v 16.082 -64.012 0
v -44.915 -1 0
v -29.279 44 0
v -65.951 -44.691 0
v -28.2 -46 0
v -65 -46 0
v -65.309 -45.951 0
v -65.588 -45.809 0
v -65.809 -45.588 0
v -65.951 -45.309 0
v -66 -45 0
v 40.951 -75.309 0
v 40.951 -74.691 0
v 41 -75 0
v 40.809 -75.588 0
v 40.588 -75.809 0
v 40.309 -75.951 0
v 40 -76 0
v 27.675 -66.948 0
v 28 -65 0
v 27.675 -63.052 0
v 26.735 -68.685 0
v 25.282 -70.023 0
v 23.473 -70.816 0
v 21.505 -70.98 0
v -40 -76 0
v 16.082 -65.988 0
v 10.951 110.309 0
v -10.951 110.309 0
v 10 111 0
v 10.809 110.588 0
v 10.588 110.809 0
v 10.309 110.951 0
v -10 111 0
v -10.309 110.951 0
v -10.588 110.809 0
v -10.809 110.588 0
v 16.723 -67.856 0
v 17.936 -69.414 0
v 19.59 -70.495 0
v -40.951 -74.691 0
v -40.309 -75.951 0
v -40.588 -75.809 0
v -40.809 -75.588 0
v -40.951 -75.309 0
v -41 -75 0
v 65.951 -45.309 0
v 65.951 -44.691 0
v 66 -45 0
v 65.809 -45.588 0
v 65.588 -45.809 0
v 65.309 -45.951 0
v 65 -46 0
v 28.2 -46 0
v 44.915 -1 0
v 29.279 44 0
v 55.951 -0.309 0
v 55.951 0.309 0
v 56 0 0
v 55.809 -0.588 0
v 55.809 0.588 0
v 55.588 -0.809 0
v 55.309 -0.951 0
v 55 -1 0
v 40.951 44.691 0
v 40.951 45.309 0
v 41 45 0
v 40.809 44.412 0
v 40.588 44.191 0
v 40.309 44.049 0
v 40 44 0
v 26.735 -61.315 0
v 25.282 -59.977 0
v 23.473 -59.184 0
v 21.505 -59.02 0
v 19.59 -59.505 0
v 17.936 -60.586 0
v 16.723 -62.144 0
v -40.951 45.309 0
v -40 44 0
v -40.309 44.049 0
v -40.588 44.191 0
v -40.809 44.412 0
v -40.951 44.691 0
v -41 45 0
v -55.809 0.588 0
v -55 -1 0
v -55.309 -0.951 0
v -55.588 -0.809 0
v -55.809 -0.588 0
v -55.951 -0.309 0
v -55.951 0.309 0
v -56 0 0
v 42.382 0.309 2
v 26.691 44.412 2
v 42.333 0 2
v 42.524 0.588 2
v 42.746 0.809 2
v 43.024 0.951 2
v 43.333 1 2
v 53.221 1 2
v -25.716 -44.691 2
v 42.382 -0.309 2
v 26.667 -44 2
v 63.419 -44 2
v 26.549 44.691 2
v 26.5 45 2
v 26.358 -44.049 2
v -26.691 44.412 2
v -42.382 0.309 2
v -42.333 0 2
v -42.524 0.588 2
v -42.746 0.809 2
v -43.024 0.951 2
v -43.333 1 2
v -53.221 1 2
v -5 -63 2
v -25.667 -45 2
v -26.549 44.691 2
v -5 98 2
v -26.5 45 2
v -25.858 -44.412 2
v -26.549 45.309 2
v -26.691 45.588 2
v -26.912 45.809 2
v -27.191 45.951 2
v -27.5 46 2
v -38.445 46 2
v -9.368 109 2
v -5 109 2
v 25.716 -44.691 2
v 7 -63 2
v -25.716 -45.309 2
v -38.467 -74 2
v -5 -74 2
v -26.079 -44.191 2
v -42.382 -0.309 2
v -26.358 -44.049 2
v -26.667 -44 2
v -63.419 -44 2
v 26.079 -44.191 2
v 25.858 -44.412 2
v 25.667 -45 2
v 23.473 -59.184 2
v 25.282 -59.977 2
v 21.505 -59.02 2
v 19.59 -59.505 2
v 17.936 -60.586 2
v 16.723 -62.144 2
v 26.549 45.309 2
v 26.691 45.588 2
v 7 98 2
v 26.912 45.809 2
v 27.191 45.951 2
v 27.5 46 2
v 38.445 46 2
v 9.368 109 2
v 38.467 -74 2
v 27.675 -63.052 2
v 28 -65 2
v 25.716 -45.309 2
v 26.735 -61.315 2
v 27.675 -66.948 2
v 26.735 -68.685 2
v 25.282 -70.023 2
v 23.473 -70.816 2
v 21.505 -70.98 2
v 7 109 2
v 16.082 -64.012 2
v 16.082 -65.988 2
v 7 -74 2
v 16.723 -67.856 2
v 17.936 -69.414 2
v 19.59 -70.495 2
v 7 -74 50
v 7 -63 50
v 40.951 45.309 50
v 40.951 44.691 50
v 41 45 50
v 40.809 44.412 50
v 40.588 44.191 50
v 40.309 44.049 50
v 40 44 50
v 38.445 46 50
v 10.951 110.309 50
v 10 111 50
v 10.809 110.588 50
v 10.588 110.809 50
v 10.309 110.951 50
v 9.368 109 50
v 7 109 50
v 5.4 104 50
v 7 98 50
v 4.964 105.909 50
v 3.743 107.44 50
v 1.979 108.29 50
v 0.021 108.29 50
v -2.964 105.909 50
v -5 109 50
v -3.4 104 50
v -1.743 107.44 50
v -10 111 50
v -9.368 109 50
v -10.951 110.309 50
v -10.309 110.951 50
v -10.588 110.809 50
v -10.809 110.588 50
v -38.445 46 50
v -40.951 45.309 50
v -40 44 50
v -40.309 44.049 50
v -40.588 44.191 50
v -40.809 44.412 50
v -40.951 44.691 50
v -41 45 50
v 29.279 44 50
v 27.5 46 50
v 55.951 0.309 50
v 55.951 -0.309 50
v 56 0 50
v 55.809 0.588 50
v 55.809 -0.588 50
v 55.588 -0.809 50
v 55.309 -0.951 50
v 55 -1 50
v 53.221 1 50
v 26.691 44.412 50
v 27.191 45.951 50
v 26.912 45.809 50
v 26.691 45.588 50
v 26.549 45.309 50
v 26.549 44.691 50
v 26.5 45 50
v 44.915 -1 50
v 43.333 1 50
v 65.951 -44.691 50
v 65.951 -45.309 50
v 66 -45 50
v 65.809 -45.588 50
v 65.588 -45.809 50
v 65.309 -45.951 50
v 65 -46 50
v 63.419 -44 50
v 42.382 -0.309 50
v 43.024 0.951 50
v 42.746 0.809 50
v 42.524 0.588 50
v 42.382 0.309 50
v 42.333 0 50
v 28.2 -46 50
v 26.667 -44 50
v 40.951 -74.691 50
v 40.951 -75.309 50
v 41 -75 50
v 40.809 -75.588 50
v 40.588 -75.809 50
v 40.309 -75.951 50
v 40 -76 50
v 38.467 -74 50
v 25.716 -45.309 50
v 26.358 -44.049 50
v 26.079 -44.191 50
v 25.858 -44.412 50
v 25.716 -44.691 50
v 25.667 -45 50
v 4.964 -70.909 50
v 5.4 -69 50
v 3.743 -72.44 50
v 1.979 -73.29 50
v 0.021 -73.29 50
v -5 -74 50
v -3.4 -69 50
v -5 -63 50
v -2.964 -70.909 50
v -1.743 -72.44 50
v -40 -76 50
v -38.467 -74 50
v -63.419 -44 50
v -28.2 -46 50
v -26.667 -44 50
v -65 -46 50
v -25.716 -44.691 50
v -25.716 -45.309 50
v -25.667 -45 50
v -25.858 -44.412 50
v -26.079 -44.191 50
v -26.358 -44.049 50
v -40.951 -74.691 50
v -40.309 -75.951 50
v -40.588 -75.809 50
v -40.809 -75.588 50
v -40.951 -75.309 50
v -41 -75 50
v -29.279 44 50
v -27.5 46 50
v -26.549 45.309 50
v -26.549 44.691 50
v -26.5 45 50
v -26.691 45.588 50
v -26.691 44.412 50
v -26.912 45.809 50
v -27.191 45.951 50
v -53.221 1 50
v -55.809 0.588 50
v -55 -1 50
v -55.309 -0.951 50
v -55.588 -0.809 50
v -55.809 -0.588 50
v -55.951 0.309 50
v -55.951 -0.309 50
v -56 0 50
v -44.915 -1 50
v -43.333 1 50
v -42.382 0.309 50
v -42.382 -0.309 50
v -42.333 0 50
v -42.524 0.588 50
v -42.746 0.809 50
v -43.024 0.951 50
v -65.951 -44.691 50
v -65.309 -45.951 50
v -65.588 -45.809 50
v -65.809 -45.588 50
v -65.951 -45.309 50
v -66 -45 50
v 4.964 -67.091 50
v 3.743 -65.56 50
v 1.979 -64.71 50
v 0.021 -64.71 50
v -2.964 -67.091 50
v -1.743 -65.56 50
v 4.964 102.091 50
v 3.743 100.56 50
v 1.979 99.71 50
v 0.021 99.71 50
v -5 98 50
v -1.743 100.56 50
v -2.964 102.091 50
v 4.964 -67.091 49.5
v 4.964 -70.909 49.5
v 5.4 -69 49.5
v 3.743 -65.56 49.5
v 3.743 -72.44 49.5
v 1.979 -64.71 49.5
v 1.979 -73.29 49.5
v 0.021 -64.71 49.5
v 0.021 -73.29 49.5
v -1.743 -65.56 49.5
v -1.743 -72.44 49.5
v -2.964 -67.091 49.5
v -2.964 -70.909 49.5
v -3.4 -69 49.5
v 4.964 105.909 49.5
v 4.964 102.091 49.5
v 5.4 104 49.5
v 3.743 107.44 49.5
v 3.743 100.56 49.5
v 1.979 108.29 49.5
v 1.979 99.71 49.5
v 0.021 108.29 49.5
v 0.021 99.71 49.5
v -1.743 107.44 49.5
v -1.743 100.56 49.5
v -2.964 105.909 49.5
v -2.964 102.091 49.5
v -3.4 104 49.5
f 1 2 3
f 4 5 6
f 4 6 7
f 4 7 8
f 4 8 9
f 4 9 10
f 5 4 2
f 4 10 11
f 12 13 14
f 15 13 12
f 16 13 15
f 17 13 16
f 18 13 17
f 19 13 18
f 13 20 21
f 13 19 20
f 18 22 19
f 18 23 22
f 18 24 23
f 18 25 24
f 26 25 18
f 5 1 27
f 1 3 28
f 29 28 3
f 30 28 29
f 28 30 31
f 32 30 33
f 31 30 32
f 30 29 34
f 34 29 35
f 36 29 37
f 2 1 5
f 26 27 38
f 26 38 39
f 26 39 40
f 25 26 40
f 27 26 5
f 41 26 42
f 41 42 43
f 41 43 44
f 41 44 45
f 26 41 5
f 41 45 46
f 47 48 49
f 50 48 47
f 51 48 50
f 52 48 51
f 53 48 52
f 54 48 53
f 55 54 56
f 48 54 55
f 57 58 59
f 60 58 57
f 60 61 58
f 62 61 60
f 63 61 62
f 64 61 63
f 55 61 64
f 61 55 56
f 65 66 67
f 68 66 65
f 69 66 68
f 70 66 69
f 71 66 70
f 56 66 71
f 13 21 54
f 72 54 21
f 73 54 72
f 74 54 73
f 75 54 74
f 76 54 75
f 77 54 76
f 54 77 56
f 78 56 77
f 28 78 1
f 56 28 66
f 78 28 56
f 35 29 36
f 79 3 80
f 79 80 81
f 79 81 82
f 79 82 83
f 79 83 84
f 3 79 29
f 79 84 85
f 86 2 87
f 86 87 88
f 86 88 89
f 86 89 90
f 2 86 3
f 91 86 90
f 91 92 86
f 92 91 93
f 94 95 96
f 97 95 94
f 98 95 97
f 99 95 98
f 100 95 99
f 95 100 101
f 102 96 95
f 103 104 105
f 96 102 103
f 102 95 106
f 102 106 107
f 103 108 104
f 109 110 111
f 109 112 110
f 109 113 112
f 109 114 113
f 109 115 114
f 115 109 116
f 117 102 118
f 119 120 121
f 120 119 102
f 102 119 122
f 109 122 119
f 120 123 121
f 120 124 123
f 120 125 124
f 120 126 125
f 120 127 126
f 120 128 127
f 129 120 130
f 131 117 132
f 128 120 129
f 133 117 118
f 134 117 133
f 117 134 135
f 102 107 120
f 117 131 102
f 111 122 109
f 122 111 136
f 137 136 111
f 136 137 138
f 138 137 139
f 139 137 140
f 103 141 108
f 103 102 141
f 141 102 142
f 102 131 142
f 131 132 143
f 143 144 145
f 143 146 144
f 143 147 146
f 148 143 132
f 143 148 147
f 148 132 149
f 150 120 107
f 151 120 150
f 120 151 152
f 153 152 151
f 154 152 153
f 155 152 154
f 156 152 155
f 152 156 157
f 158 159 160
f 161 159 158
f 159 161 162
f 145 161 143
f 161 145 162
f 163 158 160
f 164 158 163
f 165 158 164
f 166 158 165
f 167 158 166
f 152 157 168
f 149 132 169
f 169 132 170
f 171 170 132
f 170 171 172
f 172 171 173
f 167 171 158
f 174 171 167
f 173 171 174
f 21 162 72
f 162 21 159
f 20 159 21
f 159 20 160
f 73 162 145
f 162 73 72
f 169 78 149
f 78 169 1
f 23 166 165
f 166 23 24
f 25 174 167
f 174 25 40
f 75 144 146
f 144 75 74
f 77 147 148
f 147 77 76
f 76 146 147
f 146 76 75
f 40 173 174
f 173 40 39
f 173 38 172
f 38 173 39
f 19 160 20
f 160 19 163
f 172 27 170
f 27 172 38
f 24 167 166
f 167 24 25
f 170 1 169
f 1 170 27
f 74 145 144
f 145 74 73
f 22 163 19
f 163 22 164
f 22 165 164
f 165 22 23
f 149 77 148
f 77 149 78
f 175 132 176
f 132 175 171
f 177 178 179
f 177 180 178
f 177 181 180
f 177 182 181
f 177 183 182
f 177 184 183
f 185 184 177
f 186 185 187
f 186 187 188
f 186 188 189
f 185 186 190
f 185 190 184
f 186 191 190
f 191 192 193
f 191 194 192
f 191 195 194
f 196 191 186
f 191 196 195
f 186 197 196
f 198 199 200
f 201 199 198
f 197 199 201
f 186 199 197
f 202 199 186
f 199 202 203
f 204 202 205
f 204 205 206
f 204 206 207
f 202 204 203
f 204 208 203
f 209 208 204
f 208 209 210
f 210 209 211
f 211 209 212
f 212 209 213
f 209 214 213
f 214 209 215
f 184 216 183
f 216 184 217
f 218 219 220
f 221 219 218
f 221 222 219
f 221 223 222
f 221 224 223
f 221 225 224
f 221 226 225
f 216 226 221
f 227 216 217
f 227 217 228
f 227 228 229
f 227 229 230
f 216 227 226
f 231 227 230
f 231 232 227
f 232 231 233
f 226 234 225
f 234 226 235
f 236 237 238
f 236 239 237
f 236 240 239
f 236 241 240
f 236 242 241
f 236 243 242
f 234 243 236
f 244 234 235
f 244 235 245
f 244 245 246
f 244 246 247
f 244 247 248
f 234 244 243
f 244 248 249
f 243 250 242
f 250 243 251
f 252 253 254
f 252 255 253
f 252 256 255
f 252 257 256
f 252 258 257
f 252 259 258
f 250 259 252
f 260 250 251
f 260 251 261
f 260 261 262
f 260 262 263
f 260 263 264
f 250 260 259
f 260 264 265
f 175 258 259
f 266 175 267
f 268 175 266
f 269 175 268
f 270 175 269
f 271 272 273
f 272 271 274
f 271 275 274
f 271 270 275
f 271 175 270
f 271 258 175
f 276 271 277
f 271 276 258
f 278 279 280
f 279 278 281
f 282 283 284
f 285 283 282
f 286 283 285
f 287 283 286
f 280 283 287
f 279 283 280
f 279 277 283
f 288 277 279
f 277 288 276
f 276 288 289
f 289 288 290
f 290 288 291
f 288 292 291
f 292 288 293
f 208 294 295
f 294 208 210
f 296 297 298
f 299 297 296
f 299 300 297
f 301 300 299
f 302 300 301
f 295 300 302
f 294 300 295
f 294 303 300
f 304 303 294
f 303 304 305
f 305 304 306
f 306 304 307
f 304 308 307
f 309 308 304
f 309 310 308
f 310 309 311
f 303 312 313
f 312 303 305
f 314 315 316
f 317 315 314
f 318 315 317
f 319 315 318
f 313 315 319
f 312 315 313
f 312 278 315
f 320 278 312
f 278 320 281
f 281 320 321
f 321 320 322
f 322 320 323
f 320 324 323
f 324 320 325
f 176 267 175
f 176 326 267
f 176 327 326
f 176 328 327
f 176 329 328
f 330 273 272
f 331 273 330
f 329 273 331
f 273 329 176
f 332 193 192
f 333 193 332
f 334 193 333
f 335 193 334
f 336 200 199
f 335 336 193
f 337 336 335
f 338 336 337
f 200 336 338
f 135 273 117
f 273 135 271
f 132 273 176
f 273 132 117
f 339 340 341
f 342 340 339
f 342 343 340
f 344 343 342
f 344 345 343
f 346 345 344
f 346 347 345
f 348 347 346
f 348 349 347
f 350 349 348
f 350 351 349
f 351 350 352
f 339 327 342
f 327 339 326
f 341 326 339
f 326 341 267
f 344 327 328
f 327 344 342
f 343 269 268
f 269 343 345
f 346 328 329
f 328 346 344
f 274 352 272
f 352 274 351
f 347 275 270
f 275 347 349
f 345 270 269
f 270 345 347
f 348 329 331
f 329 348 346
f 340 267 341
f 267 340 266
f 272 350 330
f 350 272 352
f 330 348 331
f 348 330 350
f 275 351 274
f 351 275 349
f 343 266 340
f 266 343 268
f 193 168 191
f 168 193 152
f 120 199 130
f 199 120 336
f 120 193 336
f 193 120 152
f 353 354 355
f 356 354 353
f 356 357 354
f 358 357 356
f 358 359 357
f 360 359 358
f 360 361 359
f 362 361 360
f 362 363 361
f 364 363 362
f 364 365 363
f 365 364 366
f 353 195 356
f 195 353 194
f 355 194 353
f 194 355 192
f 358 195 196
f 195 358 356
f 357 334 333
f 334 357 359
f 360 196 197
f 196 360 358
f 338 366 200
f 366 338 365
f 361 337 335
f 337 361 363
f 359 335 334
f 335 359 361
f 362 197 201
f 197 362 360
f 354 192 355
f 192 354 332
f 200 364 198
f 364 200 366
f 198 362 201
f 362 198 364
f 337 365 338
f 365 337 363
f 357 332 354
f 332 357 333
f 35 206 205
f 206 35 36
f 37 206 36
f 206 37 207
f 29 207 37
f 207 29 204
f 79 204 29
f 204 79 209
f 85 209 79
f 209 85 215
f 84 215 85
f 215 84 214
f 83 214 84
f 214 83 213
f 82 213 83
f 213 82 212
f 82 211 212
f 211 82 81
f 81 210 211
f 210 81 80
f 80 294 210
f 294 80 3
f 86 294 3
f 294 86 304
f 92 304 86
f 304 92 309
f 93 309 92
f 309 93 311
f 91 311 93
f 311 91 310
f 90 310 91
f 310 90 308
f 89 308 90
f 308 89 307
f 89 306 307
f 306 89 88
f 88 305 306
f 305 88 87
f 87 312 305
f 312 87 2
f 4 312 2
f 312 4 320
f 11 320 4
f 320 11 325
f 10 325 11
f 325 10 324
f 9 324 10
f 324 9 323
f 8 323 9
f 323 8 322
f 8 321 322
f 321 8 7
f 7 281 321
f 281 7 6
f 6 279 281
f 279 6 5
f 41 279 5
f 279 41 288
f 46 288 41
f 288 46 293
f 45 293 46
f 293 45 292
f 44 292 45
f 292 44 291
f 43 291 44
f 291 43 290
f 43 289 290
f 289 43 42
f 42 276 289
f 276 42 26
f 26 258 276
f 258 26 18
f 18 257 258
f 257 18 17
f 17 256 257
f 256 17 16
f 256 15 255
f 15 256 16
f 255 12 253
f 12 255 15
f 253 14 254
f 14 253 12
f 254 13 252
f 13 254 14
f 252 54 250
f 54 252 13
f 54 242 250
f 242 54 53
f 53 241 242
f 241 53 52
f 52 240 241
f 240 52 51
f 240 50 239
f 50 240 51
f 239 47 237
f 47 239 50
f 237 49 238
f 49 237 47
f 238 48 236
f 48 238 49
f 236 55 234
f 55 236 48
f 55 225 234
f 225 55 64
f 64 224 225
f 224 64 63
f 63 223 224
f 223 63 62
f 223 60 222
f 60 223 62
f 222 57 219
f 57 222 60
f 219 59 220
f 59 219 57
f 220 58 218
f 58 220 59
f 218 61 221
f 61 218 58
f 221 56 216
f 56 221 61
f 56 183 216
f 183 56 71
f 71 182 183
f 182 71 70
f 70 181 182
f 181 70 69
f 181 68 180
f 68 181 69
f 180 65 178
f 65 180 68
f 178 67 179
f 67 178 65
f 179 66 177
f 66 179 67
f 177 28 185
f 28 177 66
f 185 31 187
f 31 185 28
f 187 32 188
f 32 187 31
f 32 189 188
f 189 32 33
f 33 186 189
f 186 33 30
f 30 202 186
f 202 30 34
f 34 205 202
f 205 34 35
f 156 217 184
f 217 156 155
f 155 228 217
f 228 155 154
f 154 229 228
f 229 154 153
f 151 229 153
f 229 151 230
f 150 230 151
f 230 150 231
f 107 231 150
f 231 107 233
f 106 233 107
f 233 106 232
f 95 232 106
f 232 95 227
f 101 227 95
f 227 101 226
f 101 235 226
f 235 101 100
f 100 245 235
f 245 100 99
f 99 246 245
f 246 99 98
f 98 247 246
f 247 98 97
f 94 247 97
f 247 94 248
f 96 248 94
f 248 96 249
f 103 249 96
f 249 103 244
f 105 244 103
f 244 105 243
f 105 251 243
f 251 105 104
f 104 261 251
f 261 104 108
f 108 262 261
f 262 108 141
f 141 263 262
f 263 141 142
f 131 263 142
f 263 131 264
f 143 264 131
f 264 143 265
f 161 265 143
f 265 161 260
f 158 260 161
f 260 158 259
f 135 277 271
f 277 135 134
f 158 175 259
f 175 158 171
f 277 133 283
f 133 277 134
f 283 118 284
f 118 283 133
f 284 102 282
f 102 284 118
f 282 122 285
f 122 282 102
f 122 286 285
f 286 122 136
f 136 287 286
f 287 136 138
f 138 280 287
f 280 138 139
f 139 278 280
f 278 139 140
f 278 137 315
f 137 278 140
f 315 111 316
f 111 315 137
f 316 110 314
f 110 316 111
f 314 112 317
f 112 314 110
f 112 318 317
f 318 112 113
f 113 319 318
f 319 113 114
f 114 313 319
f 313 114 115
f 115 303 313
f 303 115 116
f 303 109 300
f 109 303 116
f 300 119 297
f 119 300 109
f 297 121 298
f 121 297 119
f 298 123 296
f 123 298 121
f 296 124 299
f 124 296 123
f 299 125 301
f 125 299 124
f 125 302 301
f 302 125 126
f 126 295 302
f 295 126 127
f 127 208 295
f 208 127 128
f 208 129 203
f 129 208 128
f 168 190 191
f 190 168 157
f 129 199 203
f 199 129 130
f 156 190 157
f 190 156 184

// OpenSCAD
w = 1; 

deepTree = 50;

heightTop = 55;
height = 45;
heightBase = 30;
widthTop = 40;
widthMiddle = 55;
widthBottom = 65;
widthBase = 40;

module base_tree() {
    
    CubeFaces = [
      [0,1,2,3],  // bottom
      [4,5,1,0],  // front
      [7,6,5,4],  // top
      [5,6,2,1],  // right
      [6,7,3,2],  // back
      [7,4,0,3]]; // left

    CubePointsTop = [
      [  -widthTop,  height,  0 ],  //0
      [ widthTop,  height,  0 ],  //1
      [ widthTop / 4,  heightTop * 2,  0 ],  //2
      [  -widthTop / 4,  heightTop * 2,  0 ],  //3
      [  -widthTop,  height,  2 ],  //4
      [ widthTop,  height,  2 ],  //5
      [ widthTop / 4,  heightTop * 2,  2 ],  //6
      [  -widthTop / 4,  heightTop * 2,  2 ]]; //7
      
    polyhedron( CubePointsTop, CubeFaces );

    CubePointsMiddle = [
      [  -widthMiddle,  0,  0 ],  //0
      [ widthMiddle,  0,  0 ],  //1
      [ widthMiddle / 2,  height,  0 ],  //2
      [  -widthMiddle / 2,  height,  0 ],  //3
      [  -widthMiddle,  0,  2 ],  //4
      [ widthMiddle,  0,  2 ],  //5
      [ widthMiddle / 2,  height,  2 ],  //6
      [  -widthMiddle / 2,  height,  2 ]]; //7
      
    polyhedron( CubePointsMiddle, CubeFaces );

    CubePointsBottom = [
      [  -widthBottom,  -height,  0 ],  //0
      [ widthBottom,  -height,  0 ],  //1
      [ widthBottom / 1.5,  0,  0 ],  //2
      [  -widthBottom / 1.5,  0,  0 ],  //3
      [  -widthBottom,  -height,  2 ],  //4
      [ widthBottom,  -height,  2 ],  //5
      [ widthBottom / 1.5,  0,  2 ],  //6
      [  -widthBottom / 1.5,  0,  2 ]]; //7

    polyhedron( CubePointsBottom, CubeFaces );
    
    CubePointsBase = [
      [  -widthBase,  -height - heightBase,  0 ],  //0
      [ widthBase,  -height - heightBase,  0 ],  //1
      [ widthBase / 1.5,  -height,  0 ],  //2
      [  -widthBase / 1.5,  -height,  0 ],  //3
      [  -widthBase,  -height - heightBase,  2 ],  //4
      [ widthBase,  -height - heightBase,  2 ],  //5
      [ widthBase / 1.5,  -height,  2 ],  //6
      [  -widthBase / 1.5,  -height,  2 ]]; //7
    
    polyhedron( CubePointsBase, CubeFaces );
}

module line(p1,p2,w) {
    hull() {
        translate(p1) circle(r=w,$fn=20);
        translate(p2) circle(r=w,$fn=20);
    }
}

module polyline(points, index, w) {
    if(index < len(points)) {
        line(points[index - 1], points[index],w);
        polyline(points, index + 1, w);
    }
}

module imanSupport() {
    difference() {
        cube([12, 12, deepTree], center=false);
        translate([6, 6, deepTree-0.5]) cylinder(h=2, r=4.4);
    }
}

module half_tree() {
    poly_tree = [
        [0,  heightTop * 2],
        [widthTop / 4,  heightTop * 2],
        [widthTop,  height],
        [widthMiddle / 2,  height],
        [widthMiddle,  0],
        [widthBottom / 1.5, 0],
        [widthBottom,  -height],
        [widthBottom / 1.5,  0],
        [widthBottom,  -height],
        [widthBase / 1.5,  -height],
        [widthBase,  -height - heightBase],
        [0,  -height - heightBase]
    ];
    polyline(poly_tree,1,w);
}

module full_tree() {
    half_tree();
    mirror([1,0,0]) half_tree();
}

difference() {
    base_tree();
     translate([22, -65, -2]) cylinder(h=5, d=12);
}

linear_extrude(deepTree) 
full_tree();

translate([-5, -75, 0]) imanSupport();

translate([-5, 98, 0]) imanSupport();
